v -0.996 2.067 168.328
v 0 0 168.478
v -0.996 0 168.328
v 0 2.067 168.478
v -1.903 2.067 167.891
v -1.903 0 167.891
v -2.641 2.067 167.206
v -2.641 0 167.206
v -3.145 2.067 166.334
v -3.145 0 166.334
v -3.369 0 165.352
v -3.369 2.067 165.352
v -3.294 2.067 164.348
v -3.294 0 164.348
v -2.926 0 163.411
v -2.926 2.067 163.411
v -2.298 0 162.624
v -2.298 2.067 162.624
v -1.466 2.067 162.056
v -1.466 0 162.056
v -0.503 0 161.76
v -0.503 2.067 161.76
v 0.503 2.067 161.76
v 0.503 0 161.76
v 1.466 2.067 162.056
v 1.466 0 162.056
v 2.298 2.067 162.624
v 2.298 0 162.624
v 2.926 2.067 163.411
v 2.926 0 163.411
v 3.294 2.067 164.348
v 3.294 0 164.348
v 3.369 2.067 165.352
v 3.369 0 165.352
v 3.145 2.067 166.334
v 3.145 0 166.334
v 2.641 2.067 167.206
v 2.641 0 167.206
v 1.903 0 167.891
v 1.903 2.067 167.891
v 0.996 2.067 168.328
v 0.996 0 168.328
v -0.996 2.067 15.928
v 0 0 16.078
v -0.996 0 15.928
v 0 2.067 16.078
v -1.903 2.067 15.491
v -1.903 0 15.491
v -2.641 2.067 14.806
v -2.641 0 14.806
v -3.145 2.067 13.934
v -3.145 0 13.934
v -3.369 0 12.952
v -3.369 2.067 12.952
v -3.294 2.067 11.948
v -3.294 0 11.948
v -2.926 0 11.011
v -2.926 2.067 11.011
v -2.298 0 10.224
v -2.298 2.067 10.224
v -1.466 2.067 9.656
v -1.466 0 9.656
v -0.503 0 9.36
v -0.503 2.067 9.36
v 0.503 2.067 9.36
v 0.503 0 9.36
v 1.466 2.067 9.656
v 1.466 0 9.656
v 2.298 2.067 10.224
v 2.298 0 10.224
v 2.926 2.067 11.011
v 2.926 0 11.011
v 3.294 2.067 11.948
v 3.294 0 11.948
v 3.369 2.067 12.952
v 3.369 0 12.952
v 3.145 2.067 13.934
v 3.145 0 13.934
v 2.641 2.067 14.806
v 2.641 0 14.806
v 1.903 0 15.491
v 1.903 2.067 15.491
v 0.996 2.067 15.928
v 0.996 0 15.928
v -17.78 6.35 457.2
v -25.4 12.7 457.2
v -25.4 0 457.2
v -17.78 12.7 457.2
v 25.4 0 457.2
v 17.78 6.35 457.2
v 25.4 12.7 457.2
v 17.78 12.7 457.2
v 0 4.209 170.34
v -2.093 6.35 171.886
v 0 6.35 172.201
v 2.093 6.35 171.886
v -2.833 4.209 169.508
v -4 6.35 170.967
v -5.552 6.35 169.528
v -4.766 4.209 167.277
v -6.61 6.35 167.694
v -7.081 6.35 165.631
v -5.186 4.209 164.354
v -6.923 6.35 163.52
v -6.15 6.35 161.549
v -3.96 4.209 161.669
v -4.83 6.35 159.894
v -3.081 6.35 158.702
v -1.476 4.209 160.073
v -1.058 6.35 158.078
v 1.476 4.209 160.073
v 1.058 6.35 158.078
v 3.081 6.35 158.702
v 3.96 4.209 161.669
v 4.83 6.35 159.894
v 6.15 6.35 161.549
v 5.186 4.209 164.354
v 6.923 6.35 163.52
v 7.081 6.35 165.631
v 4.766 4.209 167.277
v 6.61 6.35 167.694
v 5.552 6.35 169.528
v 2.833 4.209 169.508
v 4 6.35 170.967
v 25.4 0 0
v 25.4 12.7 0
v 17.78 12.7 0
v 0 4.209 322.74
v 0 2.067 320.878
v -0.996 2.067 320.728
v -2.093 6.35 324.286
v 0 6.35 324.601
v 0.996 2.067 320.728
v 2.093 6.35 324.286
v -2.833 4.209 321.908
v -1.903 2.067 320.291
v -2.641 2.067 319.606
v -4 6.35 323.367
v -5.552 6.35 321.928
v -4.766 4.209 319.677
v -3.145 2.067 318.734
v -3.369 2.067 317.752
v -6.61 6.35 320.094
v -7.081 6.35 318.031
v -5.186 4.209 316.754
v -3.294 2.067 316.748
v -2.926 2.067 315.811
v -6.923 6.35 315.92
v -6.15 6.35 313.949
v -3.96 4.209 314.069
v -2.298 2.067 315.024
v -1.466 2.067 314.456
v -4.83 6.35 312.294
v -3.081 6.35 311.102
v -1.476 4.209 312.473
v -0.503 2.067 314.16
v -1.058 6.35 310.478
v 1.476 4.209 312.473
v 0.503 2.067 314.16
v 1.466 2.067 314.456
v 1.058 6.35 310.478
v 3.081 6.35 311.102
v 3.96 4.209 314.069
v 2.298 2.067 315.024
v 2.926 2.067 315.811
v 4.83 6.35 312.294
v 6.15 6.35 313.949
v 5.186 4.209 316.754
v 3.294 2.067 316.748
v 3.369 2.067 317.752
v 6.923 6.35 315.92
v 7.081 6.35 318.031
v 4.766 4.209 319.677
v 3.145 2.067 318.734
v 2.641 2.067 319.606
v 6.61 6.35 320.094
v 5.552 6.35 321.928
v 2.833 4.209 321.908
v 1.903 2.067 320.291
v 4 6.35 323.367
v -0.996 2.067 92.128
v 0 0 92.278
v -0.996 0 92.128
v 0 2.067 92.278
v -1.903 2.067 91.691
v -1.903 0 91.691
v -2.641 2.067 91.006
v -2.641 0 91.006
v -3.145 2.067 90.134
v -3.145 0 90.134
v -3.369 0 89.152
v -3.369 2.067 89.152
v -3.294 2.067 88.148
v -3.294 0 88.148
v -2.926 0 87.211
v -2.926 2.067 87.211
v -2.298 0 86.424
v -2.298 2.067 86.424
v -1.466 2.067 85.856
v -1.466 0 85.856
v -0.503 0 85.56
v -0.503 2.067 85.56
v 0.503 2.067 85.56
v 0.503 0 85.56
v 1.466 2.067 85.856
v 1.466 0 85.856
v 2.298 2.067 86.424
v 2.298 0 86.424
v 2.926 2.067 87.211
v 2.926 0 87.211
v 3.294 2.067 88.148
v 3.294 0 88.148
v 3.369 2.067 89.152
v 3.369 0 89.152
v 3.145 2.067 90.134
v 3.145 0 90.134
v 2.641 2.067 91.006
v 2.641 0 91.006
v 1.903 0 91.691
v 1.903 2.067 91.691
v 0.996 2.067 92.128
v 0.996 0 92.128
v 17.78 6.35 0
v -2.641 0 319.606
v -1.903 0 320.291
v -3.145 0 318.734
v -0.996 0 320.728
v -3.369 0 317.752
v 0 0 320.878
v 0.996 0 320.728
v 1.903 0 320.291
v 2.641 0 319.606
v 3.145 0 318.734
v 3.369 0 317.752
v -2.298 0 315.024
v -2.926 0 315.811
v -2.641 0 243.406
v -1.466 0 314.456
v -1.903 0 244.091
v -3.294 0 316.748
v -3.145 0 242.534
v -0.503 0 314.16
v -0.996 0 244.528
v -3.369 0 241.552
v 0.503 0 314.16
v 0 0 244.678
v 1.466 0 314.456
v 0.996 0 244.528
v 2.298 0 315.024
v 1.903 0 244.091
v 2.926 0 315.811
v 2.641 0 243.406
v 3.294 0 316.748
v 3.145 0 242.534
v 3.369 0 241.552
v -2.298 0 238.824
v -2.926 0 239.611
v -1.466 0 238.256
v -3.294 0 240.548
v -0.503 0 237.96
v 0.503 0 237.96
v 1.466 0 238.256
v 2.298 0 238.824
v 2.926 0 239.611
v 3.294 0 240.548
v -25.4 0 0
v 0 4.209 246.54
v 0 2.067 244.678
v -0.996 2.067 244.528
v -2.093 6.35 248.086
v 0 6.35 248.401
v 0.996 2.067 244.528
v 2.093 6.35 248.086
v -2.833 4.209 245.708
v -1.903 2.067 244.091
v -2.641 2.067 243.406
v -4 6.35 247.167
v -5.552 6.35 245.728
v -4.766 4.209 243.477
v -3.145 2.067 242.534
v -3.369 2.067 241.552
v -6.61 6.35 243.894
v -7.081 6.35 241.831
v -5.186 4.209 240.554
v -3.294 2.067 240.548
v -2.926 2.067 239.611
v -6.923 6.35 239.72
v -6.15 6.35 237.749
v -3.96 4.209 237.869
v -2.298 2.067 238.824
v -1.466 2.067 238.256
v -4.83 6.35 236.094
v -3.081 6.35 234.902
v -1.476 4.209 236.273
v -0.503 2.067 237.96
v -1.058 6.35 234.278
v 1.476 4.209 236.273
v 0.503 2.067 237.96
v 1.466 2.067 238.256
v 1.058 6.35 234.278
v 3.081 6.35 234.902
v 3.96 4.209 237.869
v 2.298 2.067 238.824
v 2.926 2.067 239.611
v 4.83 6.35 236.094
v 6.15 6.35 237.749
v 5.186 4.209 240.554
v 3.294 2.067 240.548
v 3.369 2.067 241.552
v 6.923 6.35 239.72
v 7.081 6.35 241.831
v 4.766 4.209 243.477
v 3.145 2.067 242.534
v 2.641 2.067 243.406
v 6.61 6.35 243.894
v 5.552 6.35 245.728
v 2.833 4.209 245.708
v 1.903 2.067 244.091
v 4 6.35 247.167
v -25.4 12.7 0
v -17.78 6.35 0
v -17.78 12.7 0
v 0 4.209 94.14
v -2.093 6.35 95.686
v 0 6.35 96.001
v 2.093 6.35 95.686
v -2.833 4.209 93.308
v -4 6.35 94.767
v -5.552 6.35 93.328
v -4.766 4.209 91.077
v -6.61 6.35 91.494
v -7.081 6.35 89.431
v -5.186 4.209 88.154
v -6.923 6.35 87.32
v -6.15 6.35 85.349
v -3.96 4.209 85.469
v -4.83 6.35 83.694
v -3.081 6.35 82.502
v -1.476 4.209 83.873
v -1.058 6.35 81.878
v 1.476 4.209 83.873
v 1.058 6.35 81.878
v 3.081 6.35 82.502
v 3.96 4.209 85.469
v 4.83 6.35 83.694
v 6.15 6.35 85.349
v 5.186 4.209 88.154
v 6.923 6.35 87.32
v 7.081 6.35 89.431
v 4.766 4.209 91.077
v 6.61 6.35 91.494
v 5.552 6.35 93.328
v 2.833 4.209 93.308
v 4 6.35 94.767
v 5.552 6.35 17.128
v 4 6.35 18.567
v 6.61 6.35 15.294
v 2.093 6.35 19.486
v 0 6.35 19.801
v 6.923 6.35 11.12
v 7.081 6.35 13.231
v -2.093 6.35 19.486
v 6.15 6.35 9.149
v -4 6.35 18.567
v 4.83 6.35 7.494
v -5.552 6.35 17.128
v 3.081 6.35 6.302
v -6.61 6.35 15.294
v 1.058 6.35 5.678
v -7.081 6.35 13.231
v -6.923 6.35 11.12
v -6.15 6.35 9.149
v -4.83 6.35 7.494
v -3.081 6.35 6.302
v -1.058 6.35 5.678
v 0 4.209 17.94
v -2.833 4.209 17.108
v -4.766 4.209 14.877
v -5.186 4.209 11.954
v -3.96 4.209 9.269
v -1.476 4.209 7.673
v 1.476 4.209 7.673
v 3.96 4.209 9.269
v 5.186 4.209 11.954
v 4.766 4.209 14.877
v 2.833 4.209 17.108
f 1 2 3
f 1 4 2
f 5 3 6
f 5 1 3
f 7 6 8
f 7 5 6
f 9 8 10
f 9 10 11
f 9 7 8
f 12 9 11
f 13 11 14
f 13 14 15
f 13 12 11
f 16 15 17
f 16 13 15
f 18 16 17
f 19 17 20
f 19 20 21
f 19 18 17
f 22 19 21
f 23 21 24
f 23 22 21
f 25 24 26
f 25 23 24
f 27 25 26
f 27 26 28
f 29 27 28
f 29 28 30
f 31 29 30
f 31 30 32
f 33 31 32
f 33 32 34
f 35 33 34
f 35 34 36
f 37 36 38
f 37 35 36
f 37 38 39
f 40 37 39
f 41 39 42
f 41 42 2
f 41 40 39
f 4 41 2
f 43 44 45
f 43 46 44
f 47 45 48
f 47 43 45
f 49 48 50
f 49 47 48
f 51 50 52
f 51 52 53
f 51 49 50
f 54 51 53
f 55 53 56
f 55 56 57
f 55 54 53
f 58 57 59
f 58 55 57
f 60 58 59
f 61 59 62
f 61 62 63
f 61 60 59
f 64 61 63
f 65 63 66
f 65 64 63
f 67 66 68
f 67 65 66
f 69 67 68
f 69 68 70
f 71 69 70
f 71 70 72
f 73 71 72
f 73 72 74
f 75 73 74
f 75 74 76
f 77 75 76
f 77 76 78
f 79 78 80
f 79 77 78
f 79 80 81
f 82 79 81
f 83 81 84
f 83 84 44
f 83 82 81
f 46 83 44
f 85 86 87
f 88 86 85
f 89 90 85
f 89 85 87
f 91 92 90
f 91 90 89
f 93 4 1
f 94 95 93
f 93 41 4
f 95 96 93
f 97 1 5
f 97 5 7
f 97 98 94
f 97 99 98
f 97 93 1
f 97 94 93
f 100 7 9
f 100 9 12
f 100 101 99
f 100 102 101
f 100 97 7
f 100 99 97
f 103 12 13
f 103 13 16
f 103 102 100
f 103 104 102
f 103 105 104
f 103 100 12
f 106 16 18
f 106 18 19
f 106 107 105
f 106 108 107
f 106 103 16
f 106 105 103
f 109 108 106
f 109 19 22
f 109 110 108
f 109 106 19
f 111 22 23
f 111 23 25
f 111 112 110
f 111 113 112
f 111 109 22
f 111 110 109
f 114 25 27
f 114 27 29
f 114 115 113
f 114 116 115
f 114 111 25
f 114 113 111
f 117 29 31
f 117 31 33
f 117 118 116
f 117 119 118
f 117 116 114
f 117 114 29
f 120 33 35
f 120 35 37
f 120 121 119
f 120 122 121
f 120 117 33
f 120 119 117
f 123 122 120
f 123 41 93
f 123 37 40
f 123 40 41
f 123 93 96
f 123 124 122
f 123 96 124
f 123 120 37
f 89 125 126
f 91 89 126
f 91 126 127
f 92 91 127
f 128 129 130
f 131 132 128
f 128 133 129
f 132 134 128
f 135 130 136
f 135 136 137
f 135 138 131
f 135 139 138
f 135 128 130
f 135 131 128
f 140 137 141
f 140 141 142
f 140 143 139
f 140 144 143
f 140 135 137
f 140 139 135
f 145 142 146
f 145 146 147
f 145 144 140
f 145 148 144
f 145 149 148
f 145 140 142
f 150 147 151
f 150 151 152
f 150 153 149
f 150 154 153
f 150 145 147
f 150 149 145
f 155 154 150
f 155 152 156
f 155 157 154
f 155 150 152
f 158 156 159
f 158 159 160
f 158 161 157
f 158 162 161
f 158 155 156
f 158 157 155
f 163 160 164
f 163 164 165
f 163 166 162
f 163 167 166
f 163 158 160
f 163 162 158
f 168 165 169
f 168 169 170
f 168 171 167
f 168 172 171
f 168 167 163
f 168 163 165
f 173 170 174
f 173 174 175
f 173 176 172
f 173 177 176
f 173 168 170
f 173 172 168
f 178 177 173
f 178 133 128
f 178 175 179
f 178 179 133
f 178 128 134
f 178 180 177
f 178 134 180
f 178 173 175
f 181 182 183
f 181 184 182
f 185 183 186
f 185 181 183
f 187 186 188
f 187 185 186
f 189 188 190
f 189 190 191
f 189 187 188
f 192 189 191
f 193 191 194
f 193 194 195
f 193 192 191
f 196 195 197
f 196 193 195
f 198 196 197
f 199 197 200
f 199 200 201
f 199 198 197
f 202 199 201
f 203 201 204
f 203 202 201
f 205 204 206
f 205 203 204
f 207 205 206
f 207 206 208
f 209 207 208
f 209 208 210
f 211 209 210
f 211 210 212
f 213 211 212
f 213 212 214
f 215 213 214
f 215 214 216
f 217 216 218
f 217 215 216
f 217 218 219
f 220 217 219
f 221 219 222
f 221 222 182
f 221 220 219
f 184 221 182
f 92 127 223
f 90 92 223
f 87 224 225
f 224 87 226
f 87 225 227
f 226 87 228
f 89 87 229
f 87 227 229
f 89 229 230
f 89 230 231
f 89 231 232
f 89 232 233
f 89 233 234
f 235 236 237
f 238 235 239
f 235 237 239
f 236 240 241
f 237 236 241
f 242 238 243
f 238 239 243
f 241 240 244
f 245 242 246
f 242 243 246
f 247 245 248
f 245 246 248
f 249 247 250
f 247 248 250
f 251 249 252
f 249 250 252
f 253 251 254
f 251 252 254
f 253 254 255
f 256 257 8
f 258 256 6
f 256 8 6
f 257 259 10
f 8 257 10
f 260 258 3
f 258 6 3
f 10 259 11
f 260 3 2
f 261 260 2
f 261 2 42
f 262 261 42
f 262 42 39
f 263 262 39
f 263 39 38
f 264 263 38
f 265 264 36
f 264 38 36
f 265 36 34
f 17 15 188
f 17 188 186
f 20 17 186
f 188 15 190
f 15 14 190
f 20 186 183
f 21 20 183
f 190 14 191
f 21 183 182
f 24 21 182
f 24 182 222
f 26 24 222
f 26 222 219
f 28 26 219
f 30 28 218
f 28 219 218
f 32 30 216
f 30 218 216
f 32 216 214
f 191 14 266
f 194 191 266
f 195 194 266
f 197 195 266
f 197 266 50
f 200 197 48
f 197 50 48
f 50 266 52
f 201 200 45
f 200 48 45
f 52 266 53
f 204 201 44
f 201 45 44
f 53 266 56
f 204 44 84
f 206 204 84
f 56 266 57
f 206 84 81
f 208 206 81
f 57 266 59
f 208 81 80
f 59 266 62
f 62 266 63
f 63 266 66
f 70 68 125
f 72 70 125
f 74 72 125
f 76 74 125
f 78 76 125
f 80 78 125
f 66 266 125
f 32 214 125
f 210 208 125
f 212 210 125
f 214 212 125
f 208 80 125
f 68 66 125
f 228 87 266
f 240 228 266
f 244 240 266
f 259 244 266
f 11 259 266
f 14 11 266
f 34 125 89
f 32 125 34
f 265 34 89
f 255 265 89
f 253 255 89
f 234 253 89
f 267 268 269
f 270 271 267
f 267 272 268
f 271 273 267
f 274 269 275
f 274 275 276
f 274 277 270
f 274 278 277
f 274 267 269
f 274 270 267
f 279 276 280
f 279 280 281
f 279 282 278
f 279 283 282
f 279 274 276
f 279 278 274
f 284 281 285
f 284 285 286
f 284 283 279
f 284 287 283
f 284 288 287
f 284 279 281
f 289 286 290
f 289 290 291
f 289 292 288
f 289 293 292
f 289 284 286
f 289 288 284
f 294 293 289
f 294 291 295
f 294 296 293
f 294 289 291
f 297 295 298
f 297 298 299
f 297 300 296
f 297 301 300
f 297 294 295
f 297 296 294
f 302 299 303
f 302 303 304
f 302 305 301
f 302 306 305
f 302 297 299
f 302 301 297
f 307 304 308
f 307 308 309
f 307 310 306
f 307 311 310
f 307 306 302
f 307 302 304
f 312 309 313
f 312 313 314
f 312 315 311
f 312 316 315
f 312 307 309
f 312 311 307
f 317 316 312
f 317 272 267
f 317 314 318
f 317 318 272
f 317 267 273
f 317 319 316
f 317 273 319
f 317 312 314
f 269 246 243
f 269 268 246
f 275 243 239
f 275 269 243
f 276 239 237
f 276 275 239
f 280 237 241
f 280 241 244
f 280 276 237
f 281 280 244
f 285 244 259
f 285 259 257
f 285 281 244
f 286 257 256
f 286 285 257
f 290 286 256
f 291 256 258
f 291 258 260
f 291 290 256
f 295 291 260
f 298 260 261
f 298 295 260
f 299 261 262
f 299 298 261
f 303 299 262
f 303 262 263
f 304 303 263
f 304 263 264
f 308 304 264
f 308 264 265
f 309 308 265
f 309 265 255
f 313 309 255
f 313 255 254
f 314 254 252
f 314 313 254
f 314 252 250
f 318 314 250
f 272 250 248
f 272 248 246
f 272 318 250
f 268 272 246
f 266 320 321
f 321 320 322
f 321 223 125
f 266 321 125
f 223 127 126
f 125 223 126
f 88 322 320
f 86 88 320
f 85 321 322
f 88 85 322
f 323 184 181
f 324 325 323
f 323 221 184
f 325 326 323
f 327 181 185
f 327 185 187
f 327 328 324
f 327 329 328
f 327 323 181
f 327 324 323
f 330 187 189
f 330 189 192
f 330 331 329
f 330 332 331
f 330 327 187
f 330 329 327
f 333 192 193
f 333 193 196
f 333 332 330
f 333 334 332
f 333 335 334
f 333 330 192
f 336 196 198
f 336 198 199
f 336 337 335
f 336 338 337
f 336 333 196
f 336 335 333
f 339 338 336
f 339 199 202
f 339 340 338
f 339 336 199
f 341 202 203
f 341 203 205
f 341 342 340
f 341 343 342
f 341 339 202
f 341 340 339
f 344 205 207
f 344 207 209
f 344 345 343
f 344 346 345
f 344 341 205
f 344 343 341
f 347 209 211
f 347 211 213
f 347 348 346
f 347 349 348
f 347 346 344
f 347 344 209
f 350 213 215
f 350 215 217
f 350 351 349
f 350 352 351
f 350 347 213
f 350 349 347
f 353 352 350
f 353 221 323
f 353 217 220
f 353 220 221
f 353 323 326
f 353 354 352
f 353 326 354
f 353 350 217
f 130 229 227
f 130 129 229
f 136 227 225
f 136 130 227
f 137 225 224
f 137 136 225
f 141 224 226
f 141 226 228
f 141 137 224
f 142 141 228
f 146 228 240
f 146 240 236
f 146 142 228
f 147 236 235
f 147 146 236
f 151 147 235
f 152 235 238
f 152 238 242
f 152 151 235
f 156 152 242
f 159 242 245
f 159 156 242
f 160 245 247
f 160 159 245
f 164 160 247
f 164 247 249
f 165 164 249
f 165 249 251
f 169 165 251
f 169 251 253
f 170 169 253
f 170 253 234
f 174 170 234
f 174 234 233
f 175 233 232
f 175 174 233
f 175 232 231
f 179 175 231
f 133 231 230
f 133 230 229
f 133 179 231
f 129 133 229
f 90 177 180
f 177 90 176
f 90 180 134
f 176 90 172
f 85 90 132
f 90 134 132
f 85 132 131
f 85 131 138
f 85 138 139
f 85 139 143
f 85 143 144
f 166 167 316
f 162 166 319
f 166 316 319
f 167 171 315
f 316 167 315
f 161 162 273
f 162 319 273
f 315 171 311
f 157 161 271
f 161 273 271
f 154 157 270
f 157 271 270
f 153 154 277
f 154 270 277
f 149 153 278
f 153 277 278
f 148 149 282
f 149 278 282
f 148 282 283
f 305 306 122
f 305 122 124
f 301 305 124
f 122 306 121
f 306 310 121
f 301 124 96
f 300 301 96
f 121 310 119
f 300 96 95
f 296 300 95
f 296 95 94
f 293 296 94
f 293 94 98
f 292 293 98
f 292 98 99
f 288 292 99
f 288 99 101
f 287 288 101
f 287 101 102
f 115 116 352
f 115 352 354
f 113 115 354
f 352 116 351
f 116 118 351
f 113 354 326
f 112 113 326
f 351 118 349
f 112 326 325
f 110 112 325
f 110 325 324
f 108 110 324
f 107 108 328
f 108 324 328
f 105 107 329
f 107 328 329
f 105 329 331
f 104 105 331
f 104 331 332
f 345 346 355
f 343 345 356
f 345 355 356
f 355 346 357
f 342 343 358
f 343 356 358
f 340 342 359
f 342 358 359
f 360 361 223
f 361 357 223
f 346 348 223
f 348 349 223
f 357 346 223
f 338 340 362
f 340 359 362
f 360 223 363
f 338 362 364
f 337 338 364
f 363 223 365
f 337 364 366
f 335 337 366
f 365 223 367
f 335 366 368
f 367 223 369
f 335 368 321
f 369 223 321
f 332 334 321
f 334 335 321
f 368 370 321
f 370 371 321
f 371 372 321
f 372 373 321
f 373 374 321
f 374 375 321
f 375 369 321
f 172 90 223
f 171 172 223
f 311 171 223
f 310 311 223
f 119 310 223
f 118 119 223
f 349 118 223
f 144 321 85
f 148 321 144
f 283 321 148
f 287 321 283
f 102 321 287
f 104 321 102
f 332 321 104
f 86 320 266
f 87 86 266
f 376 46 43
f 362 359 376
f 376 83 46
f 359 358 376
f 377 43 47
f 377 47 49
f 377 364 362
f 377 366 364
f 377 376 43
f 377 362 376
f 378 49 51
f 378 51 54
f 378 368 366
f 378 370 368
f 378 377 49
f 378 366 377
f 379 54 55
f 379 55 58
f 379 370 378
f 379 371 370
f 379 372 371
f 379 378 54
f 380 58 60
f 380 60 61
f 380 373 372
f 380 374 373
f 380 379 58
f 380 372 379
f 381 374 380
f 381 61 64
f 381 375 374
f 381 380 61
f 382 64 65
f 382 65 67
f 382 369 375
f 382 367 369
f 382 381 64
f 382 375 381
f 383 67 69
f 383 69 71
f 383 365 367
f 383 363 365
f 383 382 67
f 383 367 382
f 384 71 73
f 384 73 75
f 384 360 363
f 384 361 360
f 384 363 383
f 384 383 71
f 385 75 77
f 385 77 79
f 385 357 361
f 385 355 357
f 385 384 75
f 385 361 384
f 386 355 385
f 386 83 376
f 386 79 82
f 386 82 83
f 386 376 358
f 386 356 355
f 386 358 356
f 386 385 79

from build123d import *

# Parameters (mm, degrees)
BOSS_EXTRUDE1_DEPTH                           = 457.2
CSK_FOR_1_4_FLAT_HEAD_MACHINE_SCREW3_AT_COUNT = 2
CSK_FOR_1_4_FLAT_HEAD_MACHINE_SCREW3_AT_PITCH = 76.2
CSK_FOR_1_4_FLAT_HEAD_MACHINE_SCREW3_2_COUNT  = 2
CSK_FOR_1_4_FLAT_HEAD_MACHINE_SCREW3_2_PITCH  = 152.4
CSK_FOR_1_4_FLAT_HEAD_MACHINE_SCREW3_3_COUNT  = 2
CSK_FOR_1_4_FLAT_HEAD_MACHINE_SCREW3_3_PITCH  = 228.6
CSK_FOR_1_4_FLAT_HEAD_MACHINE_SCREW3_4_COUNT  = 2
CSK_FOR_1_4_FLAT_HEAD_MACHINE_SCREW3_4_PITCH  = 304.8


with BuildPart() as part:
    # Sketch → Boss-Extrude1 (new body)
    with BuildSketch(Plane.XY):
        Polygon((-17.78, 6.35), (-17.78, 12.7), (-25.4, 12.7), (-25.4, 0), (25.4, 0), (25.4, 12.7), (17.78, 12.7), (17.78, 6.35), align=None)
    extrude(amount=BOSS_EXTRUDE1_DEPTH)

    # Sketch4 → CSK for 1/4 Flat Head Machine Screw3 (revolve, cut)
    with BuildSketch(Plane(origin=(0, 6.35, 12.7), x_dir=(0, 0, 1), z_dir=(1, 0, 0))):
        Polygon((0, 0), (0, 6.35), (3.3782, 6.35), (3.3782, 4.28291499), (7.1012812, 0), align=None)
    csk_for_1_4_flat_head_machine_screw3 = revolve(axis=Axis((0, 12.7, 12.7), (0, -1, 0)), mode=Mode.SUBTRACT)

    # CSK for 1/4 Flat Head Machine Screw3 at: CSK for 1/4 Flat Head Machine Screw3 ×2
    with Locations(*[(0, 0, i * CSK_FOR_1_4_FLAT_HEAD_MACHINE_SCREW3_AT_PITCH) for i in range(1, CSK_FOR_1_4_FLAT_HEAD_MACHINE_SCREW3_AT_COUNT)]):
        add(csk_for_1_4_flat_head_machine_screw3, mode=Mode.SUBTRACT)

    # CSK for 1_4 Flat Head Machine Screw3 2: CSK for 1/4 Flat Head Machine Screw3 ×2
    with Locations(*[(0, 0, i * CSK_FOR_1_4_FLAT_HEAD_MACHINE_SCREW3_2_PITCH) for i in range(1, CSK_FOR_1_4_FLAT_HEAD_MACHINE_SCREW3_2_COUNT)]):
        add(csk_for_1_4_flat_head_machine_screw3, mode=Mode.SUBTRACT)

    # CSK for 1_4 Flat Head Machine Screw3 3: CSK for 1/4 Flat Head Machine Screw3 ×2
    with Locations(*[(0, 0, i * CSK_FOR_1_4_FLAT_HEAD_MACHINE_SCREW3_3_PITCH) for i in range(1, CSK_FOR_1_4_FLAT_HEAD_MACHINE_SCREW3_3_COUNT)]):
        add(csk_for_1_4_flat_head_machine_screw3, mode=Mode.SUBTRACT)

    # CSK for 1_4 Flat Head Machine Screw3 4: CSK for 1/4 Flat Head Machine Screw3 ×2
    with Locations(*[(0, 0, i * CSK_FOR_1_4_FLAT_HEAD_MACHINE_SCREW3_4_PITCH) for i in range(1, CSK_FOR_1_4_FLAT_HEAD_MACHINE_SCREW3_4_COUNT)]):
        add(csk_for_1_4_flat_head_machine_screw3, mode=Mode.SUBTRACT)


solid = part.part
